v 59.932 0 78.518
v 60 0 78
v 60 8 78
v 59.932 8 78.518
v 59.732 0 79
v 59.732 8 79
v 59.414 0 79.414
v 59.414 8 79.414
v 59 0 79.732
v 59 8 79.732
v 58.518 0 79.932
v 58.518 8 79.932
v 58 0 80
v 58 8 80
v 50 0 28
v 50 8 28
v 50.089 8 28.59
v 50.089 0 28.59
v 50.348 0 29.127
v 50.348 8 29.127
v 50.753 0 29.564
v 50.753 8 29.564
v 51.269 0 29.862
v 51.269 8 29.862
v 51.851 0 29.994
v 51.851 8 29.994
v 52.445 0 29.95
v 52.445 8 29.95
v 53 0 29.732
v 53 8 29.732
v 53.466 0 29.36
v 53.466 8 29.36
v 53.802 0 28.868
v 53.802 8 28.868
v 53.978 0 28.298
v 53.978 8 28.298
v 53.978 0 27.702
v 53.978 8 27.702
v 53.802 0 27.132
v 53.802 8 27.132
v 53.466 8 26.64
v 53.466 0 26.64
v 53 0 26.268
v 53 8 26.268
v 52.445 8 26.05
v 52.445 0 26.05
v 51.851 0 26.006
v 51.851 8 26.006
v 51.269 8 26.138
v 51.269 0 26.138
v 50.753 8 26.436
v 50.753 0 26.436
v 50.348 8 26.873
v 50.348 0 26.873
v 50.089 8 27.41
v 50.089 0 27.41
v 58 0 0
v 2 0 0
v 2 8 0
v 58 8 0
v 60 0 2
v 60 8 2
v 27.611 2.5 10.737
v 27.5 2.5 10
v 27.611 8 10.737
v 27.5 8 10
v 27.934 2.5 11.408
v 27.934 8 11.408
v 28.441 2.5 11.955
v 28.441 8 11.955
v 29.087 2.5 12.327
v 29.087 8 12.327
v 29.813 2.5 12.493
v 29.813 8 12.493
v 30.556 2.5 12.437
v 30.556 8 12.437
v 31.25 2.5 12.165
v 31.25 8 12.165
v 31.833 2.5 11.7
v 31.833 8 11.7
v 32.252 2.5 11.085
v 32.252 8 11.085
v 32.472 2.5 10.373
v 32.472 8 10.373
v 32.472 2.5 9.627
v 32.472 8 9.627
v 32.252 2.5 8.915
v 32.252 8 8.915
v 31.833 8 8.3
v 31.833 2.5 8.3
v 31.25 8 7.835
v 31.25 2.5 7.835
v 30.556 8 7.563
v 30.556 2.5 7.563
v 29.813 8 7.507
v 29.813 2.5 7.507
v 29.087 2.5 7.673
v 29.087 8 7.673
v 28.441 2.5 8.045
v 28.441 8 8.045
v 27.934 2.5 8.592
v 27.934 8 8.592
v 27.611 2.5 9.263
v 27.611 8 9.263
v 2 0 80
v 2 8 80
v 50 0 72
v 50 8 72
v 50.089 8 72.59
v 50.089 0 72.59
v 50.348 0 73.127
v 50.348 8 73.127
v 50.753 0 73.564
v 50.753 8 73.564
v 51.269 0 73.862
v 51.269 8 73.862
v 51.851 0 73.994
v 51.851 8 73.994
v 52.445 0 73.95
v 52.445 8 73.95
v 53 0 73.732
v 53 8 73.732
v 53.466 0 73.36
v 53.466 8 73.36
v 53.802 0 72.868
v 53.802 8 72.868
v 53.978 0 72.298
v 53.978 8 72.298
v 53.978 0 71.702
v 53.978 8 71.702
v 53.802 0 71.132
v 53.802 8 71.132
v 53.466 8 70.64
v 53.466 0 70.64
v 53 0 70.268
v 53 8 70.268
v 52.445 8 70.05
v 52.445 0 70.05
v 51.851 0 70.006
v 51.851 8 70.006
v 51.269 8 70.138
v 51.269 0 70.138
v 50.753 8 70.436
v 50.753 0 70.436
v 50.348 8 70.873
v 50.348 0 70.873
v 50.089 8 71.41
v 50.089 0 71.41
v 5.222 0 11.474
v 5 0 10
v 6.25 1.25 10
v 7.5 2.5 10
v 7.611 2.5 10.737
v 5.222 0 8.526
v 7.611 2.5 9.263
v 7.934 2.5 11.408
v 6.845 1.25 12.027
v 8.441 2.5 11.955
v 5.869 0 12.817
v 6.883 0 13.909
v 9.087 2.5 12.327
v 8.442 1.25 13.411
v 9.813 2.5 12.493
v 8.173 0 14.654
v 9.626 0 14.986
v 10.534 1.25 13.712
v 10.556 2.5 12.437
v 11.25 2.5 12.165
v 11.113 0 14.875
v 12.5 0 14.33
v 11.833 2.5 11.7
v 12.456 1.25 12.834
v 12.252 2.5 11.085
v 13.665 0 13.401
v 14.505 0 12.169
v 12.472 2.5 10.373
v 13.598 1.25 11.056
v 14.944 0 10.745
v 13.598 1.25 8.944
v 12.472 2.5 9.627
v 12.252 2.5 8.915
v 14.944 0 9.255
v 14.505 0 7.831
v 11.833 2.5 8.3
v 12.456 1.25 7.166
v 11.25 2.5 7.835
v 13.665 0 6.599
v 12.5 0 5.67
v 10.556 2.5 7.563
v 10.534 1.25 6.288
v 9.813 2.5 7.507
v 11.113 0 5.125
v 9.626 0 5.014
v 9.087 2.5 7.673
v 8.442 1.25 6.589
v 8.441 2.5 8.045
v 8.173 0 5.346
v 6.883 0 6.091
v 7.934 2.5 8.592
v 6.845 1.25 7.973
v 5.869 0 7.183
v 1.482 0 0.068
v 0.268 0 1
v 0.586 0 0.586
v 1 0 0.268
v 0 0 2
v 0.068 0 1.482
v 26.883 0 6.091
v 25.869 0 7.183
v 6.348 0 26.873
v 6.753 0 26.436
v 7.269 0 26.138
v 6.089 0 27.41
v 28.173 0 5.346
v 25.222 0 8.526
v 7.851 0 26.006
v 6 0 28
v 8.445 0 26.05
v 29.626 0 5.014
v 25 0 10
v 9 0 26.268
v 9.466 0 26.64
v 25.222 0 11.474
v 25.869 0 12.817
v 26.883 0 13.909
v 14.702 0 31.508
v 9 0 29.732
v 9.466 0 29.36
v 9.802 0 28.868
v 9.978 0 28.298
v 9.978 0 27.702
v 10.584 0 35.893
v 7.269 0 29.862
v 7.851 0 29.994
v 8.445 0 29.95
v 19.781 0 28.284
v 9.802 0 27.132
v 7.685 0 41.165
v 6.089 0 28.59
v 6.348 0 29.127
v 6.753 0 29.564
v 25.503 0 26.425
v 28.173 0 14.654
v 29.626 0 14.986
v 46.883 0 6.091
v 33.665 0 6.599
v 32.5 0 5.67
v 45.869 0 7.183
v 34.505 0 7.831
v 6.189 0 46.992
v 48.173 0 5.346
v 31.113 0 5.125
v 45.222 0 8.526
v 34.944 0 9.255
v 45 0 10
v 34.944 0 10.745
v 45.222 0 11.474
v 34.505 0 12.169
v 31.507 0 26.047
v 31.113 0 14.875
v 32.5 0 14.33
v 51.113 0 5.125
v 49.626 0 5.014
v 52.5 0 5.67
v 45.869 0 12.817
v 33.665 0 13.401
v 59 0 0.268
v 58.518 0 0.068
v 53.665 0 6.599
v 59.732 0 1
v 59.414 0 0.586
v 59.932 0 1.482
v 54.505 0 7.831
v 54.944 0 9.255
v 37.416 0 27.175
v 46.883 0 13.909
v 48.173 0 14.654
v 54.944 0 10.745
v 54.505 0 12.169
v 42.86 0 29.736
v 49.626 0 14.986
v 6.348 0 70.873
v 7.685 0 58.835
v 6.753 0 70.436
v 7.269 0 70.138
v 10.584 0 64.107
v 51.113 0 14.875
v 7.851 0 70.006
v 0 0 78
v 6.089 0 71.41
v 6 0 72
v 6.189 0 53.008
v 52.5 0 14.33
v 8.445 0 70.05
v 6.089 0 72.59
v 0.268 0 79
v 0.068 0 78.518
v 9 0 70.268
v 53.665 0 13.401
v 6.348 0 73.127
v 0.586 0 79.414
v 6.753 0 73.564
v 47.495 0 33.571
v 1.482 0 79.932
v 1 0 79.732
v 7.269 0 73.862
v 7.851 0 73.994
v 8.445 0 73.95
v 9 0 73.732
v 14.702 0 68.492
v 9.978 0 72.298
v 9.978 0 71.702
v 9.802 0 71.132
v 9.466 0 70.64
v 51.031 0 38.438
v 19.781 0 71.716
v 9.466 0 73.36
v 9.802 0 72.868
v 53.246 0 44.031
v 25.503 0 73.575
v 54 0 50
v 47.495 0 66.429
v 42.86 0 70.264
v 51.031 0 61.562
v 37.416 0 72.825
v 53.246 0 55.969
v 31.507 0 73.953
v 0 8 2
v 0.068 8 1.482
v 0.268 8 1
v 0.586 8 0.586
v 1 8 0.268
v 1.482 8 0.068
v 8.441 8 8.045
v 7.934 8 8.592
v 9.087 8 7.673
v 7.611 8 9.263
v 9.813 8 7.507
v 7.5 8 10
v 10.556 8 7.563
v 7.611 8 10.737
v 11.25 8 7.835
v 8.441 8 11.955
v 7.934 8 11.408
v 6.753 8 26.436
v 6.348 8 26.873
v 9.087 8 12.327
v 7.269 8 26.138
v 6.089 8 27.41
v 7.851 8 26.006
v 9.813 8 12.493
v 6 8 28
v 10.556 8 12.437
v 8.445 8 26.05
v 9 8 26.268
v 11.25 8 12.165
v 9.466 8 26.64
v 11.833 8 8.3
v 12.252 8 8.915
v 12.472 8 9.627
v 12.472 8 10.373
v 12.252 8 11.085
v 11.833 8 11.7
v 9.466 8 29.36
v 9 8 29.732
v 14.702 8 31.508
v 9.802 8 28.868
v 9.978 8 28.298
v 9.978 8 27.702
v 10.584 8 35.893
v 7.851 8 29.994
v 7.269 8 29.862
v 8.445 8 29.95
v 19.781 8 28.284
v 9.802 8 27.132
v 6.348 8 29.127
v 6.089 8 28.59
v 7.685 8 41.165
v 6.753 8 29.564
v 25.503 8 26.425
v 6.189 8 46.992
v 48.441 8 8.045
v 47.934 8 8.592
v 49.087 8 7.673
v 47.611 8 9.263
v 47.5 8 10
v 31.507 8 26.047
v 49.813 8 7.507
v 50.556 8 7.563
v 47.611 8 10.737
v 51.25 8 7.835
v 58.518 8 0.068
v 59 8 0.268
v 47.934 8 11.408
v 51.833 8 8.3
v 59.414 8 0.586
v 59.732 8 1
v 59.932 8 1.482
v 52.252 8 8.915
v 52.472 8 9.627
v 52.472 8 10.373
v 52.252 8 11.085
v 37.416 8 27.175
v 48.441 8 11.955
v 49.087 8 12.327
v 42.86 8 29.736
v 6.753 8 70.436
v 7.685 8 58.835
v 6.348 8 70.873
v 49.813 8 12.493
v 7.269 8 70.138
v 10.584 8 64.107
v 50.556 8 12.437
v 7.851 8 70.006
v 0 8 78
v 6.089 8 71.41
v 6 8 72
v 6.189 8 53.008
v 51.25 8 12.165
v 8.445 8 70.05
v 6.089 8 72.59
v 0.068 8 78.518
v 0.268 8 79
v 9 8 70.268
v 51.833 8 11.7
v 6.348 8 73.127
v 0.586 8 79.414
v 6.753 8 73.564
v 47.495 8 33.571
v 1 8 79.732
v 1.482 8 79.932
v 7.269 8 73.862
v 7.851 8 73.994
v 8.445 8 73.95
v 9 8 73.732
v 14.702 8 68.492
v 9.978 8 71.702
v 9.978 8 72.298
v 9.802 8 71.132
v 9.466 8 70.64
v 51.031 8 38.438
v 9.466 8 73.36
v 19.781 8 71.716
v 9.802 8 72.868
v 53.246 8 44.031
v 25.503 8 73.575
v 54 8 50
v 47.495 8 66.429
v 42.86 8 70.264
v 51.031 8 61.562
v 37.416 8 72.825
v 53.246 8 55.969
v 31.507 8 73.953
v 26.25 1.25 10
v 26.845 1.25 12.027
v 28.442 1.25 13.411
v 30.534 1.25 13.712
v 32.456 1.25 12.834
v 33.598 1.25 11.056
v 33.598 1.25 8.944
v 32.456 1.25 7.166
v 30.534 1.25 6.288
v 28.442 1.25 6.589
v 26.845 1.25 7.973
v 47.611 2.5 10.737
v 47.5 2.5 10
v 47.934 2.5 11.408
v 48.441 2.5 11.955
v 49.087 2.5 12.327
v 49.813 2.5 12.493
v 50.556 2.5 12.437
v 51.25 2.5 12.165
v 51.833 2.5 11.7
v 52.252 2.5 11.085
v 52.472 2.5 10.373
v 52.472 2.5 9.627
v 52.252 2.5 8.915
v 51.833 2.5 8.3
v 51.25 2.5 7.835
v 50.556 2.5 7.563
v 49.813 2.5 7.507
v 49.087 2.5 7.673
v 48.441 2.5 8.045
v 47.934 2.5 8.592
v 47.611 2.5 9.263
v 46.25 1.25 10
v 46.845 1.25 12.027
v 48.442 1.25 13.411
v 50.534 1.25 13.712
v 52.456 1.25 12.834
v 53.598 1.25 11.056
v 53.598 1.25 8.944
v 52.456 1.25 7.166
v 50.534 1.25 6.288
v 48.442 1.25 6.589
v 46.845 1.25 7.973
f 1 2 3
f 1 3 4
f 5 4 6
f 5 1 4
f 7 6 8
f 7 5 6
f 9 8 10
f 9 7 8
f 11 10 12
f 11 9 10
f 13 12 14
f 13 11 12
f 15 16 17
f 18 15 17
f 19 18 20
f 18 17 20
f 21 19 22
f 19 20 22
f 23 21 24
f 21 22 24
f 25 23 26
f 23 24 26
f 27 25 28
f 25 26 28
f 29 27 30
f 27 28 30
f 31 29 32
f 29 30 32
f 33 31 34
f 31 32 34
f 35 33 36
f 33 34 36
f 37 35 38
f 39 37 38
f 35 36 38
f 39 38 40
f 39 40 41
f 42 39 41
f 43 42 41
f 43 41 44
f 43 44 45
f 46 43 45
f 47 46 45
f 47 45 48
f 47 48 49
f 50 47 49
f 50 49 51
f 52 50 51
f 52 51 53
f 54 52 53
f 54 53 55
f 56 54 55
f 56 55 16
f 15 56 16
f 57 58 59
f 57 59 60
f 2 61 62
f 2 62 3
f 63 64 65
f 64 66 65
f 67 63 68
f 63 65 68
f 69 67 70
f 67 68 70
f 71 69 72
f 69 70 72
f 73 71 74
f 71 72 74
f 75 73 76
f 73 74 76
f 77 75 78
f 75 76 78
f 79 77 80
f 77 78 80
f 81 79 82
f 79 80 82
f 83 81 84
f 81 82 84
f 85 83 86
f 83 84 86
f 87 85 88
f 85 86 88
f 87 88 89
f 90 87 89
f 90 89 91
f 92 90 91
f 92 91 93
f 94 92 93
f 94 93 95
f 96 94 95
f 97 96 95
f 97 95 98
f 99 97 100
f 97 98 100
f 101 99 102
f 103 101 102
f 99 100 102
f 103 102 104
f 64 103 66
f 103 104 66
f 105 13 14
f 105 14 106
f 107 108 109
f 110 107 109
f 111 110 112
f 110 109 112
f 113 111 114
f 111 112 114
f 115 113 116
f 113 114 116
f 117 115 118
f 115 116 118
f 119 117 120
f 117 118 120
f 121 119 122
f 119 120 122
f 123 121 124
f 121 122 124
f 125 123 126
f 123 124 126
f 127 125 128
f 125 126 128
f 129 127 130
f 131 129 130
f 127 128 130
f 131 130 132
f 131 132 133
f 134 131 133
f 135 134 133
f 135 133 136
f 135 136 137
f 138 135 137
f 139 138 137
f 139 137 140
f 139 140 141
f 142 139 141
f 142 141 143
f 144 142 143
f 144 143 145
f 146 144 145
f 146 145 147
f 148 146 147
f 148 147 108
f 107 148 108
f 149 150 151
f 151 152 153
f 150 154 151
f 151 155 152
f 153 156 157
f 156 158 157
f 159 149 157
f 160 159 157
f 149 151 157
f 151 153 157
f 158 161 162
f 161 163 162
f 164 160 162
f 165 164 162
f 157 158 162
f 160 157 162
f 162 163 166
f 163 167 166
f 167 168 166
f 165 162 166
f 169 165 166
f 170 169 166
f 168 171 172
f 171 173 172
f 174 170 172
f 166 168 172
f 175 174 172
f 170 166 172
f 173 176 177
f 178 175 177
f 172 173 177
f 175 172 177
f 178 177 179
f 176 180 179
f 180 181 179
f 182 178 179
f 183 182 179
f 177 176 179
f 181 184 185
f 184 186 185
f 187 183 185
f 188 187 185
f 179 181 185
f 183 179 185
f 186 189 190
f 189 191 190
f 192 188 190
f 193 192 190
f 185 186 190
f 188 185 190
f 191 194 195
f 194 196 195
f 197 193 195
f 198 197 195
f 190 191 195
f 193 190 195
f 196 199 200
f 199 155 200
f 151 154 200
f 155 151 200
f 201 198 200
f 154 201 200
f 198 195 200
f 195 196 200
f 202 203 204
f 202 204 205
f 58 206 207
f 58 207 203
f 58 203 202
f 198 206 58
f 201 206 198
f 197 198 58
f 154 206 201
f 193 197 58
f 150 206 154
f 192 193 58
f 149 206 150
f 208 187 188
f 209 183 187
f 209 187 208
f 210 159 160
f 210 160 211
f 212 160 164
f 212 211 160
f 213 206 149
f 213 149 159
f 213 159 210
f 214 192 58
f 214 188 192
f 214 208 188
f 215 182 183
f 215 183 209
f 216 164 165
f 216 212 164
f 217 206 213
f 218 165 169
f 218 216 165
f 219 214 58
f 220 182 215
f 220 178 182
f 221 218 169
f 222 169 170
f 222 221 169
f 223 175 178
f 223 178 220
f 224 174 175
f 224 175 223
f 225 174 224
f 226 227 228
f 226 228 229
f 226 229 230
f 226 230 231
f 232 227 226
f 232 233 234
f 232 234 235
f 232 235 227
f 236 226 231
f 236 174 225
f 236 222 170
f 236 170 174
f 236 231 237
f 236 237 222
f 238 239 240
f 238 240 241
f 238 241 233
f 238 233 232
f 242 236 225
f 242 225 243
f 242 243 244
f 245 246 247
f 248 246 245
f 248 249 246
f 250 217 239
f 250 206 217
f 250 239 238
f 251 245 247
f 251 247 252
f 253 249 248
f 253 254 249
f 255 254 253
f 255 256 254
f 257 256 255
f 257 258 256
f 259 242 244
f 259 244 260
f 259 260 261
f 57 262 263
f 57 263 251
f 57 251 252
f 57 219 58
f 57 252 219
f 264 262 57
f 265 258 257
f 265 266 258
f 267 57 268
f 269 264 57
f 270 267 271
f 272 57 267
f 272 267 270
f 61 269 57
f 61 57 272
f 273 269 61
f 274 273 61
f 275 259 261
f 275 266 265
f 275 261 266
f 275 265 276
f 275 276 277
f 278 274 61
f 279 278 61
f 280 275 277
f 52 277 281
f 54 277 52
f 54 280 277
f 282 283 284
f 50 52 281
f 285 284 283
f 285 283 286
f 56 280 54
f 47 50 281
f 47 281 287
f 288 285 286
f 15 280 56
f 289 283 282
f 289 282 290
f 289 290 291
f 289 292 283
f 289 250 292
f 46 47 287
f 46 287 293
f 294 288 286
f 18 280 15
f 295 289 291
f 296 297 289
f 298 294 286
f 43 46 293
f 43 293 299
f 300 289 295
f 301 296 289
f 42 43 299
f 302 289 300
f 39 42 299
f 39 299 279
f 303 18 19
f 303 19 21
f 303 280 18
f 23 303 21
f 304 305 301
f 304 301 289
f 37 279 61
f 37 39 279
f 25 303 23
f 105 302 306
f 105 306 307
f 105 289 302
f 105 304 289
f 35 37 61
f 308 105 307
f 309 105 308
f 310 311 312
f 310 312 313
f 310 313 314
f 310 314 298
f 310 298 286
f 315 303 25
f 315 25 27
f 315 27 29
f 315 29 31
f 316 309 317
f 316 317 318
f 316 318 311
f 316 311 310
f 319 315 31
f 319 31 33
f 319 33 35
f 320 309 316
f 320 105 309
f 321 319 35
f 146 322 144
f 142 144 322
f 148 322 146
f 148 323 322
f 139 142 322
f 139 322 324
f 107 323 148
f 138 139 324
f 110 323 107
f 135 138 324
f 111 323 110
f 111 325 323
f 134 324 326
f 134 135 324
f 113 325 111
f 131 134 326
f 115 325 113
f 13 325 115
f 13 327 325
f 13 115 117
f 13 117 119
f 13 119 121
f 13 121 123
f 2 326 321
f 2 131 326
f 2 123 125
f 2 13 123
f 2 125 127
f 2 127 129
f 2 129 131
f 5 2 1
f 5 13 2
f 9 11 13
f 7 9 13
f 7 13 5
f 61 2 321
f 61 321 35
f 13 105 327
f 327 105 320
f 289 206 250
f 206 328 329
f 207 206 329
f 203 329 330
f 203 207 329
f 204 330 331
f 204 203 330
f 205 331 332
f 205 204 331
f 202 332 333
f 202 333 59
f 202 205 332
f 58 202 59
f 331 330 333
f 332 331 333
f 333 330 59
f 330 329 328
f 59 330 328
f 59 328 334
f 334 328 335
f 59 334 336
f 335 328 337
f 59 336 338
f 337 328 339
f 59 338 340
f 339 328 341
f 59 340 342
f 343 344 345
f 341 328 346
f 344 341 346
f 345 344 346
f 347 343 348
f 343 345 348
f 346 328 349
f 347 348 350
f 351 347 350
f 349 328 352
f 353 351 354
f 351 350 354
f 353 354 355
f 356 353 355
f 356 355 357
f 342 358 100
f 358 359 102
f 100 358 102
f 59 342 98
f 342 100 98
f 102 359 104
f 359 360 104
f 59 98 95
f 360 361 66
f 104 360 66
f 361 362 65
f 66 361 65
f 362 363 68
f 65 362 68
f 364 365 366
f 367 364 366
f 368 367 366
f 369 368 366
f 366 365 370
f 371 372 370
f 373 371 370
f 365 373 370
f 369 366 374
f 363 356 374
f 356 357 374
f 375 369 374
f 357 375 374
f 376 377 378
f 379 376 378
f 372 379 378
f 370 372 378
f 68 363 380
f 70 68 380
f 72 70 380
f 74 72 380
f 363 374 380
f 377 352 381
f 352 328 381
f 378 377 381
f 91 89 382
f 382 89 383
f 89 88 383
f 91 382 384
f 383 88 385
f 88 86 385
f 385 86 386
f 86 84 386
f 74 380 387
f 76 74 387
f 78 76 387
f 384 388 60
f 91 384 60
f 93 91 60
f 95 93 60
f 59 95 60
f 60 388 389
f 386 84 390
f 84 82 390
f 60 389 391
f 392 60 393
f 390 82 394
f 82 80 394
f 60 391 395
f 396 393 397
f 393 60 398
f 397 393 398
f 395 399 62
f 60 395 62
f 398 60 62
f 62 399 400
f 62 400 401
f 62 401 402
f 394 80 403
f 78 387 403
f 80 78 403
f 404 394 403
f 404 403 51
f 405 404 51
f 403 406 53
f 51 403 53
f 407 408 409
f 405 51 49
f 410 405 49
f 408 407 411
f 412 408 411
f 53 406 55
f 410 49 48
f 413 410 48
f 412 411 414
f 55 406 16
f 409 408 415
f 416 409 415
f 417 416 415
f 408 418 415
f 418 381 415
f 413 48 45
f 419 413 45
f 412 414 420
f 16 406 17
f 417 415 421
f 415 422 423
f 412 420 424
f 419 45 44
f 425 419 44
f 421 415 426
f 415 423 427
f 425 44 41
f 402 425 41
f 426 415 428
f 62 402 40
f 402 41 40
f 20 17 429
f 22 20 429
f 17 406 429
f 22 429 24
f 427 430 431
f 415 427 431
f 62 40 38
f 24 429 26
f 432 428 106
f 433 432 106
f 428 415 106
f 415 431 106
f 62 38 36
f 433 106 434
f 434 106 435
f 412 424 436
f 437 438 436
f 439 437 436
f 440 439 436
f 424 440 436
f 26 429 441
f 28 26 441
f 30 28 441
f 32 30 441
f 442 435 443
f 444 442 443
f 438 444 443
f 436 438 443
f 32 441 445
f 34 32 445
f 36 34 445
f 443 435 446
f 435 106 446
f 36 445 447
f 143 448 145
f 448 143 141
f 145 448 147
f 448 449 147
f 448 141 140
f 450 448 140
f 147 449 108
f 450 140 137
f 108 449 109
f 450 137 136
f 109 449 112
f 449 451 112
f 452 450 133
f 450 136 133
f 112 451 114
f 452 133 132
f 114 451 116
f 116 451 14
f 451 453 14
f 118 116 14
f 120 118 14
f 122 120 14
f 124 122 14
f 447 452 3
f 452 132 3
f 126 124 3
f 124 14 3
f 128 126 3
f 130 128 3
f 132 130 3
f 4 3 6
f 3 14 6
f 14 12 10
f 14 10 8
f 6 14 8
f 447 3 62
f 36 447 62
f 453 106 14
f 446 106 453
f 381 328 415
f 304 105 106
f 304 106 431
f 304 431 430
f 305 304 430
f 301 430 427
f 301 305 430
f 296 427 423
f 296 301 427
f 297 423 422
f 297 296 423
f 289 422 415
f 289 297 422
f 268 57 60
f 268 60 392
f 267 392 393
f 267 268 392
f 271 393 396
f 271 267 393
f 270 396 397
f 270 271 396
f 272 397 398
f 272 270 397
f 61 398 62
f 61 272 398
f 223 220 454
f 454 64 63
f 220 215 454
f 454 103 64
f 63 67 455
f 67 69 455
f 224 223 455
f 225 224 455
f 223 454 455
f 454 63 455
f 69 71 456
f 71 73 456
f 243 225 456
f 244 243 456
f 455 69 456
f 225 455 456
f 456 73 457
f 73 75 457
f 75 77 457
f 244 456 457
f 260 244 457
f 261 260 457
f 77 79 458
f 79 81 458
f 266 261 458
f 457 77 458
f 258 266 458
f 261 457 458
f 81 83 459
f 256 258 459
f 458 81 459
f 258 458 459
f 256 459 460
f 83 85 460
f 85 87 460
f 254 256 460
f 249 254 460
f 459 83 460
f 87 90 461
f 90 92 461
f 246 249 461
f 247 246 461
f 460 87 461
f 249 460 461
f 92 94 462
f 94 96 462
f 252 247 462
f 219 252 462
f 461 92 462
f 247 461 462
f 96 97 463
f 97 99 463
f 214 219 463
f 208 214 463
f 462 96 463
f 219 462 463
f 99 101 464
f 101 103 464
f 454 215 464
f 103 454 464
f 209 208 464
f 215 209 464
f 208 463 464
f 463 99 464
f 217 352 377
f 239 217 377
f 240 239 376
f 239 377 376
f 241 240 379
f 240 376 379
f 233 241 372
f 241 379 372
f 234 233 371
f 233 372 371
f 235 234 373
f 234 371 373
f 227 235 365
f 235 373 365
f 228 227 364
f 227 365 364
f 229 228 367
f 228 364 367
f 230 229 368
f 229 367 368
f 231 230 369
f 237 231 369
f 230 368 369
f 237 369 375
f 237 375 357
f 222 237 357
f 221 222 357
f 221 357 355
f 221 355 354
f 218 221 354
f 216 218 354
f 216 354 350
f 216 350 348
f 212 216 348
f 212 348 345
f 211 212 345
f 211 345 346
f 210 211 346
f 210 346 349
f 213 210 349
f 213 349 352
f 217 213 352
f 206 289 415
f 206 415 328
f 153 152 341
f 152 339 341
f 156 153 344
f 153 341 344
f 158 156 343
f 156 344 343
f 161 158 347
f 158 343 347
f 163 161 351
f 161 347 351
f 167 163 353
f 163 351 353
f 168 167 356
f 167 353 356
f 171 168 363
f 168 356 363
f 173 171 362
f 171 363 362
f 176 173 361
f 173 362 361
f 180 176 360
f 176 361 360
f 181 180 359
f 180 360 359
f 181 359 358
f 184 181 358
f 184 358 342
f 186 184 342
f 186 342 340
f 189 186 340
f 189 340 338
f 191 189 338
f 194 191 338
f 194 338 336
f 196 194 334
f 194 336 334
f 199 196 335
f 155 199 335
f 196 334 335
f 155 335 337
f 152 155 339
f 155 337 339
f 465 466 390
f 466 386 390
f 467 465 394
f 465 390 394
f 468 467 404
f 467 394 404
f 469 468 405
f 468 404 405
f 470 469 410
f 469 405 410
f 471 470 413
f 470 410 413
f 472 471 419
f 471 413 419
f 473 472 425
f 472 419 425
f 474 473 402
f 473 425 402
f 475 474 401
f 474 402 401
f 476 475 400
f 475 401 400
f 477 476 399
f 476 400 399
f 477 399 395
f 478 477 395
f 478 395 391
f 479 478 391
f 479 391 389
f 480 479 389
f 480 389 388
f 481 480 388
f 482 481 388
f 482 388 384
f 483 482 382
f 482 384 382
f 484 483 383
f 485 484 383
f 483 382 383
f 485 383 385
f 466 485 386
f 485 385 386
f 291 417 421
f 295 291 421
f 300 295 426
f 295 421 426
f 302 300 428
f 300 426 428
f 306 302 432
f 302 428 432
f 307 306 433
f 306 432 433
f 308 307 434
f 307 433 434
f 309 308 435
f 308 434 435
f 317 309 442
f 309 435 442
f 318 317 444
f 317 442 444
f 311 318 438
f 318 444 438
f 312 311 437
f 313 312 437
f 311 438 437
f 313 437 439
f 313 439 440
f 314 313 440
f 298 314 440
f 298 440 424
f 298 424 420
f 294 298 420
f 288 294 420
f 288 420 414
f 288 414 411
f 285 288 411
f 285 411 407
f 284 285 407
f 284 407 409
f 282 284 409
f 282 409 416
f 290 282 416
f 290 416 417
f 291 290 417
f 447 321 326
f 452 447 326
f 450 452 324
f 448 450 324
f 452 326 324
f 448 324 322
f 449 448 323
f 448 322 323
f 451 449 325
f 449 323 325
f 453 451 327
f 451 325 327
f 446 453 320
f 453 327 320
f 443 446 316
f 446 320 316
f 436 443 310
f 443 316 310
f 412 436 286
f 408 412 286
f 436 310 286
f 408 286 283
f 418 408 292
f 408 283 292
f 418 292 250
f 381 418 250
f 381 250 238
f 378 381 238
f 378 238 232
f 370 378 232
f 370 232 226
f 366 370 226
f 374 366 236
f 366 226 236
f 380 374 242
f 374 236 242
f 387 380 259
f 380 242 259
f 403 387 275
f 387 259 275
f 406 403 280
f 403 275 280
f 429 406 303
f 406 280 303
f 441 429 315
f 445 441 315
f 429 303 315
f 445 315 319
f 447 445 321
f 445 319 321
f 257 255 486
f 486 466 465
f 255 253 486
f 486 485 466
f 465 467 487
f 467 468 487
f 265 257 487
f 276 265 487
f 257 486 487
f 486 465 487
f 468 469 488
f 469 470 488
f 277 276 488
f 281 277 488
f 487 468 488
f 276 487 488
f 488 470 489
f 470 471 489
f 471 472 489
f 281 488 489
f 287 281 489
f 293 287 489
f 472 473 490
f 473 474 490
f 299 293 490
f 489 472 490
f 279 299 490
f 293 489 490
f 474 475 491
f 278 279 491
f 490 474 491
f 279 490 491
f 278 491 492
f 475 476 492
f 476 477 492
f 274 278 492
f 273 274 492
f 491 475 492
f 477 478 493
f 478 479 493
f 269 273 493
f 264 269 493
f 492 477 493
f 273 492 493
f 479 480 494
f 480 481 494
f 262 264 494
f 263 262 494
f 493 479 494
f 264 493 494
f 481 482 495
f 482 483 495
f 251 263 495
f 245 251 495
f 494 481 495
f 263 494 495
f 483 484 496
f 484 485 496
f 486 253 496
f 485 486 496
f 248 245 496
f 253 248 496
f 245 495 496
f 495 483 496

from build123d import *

# Parameters (mm, degrees)
F0_R           = 24
F1_DEPTH       = 8
F2_D           = 5
F2_CSINK_D     = 10
F2_CSINK_ANGLE = 90
F3_D           = 4


with BuildPart() as f1:
    # F0 (on Front) → F1 (new body)
    with BuildSketch(Plane.XZ):
        with BuildLine():
            ThreePointArc((0, 2), (0.585786, 0.585786), (2, 0))
            Line((2, 0), (58, 0))
            ThreePointArc((58, 0), (59.414214, 0.585786), (60, 2))
            Line((60, 2), (60, 78))
            ThreePointArc((60, 78), (59.414214, 79.414214), (58, 80))
            Line((58, 80), (2, 80))
            ThreePointArc((2, 80), (0.585786, 79.414214), (0, 78))
            Line((0, 78), (0, 2))
        make_face()
        with Locations((30, 50)):
            Circle(F0_R, mode=Mode.SUBTRACT)
    extrude(amount=-F1_DEPTH)

    # F2 (through all)
    with Locations(Plane.XZ):
        with Locations((10, 10), (30, 10), (50, 10)):
            CounterSinkHole(F2_D / 2, F2_CSINK_D / 2, counter_sink_angle=F2_CSINK_ANGLE)

    # F3 (through all)
    with Locations(Plane.XZ):
        with Locations((8, 72), (52, 72), (52, 28), (8, 28)):
            Hole(F3_D / 2)


solid = f1.part
